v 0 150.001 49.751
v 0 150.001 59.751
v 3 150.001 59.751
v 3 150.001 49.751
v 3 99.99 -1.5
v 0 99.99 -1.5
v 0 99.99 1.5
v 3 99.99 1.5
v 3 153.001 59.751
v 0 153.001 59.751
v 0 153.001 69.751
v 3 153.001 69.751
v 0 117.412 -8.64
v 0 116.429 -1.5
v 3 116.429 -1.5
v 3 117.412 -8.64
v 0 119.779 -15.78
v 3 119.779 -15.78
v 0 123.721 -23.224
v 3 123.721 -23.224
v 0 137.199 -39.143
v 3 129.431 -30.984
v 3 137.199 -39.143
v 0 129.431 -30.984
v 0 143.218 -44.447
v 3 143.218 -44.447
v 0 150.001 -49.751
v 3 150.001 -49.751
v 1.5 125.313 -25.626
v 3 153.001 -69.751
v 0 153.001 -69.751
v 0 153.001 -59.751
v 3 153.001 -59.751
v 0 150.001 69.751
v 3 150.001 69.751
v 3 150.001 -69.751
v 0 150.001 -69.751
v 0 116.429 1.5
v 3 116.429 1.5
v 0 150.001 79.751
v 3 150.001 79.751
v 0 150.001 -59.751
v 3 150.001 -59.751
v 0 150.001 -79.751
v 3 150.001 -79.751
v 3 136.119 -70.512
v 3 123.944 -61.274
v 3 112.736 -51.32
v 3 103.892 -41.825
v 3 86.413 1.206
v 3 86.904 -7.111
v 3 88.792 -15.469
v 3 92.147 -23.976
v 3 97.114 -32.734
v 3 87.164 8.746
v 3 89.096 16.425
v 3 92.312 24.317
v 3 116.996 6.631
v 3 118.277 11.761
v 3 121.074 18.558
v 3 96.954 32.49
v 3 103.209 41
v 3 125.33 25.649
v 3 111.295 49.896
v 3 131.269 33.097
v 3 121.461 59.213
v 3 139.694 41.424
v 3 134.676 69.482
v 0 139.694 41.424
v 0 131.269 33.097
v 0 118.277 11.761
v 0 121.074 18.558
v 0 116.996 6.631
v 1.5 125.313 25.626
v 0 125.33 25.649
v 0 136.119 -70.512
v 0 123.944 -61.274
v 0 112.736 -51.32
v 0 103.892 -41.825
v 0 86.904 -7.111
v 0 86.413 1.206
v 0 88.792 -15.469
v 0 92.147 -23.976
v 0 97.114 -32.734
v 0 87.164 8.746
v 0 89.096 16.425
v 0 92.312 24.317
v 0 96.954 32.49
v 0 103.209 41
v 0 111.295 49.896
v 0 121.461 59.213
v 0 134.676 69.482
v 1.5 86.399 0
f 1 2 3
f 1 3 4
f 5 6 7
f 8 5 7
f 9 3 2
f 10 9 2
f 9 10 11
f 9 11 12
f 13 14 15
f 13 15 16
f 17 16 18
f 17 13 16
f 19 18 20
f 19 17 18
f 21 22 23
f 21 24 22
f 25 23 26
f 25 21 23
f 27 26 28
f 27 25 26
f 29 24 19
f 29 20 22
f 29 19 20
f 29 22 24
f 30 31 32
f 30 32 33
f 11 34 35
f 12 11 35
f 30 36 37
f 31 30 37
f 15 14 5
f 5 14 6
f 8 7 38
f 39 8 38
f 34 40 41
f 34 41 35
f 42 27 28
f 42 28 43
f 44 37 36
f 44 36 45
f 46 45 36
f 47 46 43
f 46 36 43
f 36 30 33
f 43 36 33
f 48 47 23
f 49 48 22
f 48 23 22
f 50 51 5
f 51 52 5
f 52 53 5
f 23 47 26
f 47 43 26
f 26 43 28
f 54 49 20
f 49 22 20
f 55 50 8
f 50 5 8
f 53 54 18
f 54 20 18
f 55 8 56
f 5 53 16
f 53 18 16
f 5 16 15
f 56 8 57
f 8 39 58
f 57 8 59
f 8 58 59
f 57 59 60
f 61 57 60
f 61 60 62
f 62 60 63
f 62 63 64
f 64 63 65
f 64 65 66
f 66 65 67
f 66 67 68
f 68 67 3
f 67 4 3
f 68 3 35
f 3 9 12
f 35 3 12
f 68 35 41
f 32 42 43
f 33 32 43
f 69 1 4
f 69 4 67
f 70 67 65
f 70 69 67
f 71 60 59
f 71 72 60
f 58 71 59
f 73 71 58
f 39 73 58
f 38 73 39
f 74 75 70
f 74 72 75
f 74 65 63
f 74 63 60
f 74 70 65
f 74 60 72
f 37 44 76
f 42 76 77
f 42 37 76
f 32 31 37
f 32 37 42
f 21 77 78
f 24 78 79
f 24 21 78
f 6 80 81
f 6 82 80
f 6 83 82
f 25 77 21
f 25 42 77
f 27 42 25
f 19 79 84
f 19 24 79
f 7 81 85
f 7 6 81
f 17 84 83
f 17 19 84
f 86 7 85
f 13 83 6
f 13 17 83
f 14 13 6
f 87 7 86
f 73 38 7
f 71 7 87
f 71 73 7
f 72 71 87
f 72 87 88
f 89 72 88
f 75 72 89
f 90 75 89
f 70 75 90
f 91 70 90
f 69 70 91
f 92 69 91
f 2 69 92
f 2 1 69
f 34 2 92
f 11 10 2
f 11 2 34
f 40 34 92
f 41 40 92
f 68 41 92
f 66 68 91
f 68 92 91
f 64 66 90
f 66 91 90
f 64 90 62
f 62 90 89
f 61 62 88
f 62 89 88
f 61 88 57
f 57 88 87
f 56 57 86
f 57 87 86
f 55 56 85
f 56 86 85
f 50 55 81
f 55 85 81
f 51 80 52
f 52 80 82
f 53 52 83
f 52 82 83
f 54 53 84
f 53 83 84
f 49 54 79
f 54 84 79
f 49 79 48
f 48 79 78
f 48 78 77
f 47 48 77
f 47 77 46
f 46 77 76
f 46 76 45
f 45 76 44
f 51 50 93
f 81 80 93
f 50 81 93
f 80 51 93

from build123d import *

# Parameters (mm, degrees)
EXTRUDE_1_DEPTH     = 3
EXTRUDE_2_DEPTH     = 3
CUT_EXTRUDE_1_DEPTH = 173.564004098


with BuildPart() as part:
    # 草图1 → 凸台-拉伸1 (new body)
    with BuildSketch(Plane(origin=(0, 0, 0), x_dir=(0, 0, -1), z_dir=(1, 0, 0))):
        with BuildLine():
            Line((-79.7507074, 150.000523308), (-49.751094174, 150.000523308))
            add(Edge.make_bspline(
                [(-49.751094174, 150.000523308), (0, 82.797016692), (49.751094174, 150.000523308)],
                knots=[0.222336685, 0.222336685, 0.222336685, 0.777663315, 0.777663315, 0.777663315], degree=2))
            Line((49.751094174, 150.000523308), (79.7507074, 150.000523308))
            add(Edge.make_bspline(
                [(-79.7507074, 150.000523308), (0, 22.797016692), (79.7507074, 150.000523308)],
                knots=[0.059549815, 0.059549815, 0.059549815, 0.940450185, 0.940450185, 0.940450185], degree=2))
        make_face()
    extrude(amount=EXTRUDE_1_DEPTH)

    # 草图2 → 凸台-拉伸2 (add)
    with BuildSketch(Plane(origin=(0, 150.000523308, 0), x_dir=(1, 0, 0), z_dir=(0, 1, 0))):
        Polygon((3, -59.750900787), (0.999993554, -59.750900787), (2.000006446, -69.750900787), (3, -69.750900787), align=None)
        Polygon((2.000006446, -69.750900787), (0.999993554, -59.750900787), (0, -59.750900787), (0, -69.750900787), align=None)
        Polygon((2.000006446, 59.750900787), (0.999993554, 69.750900787), (0, 69.750900787), (0, 59.750900787), align=None)
        Polygon((3, 69.750900787), (0.999993554, 69.750900787), (2.000006446, 59.750900787), (3, 59.750900787), align=None)
    extrude(amount=EXTRUDE_2_DEPTH)

    # 草图3 → 切除-拉伸1 (cut, through all)
    with BuildSketch(Plane.ZY):
        with BuildLine():
            Line((-1.5, 116.429314933), (-1.5, 99.990363817))
            Line((-1.5, 99.990363817), (1.5, 99.990363817))
            Line((1.5, 99.990363817), (1.5, 116.429314934))
            add(Edge.make_bspline(
                [(1.5, 116.429314934), (0, 116.368225067), (-1.5, 116.429314933)],
                knots=[0.491628426, 0.491628426, 0.491628426, 0.508371574, 0.508371574, 0.508371574], degree=2))
        make_face()
    extrude(amount=-CUT_EXTRUDE_1_DEPTH, mode=Mode.SUBTRACT)


solid = part.part
